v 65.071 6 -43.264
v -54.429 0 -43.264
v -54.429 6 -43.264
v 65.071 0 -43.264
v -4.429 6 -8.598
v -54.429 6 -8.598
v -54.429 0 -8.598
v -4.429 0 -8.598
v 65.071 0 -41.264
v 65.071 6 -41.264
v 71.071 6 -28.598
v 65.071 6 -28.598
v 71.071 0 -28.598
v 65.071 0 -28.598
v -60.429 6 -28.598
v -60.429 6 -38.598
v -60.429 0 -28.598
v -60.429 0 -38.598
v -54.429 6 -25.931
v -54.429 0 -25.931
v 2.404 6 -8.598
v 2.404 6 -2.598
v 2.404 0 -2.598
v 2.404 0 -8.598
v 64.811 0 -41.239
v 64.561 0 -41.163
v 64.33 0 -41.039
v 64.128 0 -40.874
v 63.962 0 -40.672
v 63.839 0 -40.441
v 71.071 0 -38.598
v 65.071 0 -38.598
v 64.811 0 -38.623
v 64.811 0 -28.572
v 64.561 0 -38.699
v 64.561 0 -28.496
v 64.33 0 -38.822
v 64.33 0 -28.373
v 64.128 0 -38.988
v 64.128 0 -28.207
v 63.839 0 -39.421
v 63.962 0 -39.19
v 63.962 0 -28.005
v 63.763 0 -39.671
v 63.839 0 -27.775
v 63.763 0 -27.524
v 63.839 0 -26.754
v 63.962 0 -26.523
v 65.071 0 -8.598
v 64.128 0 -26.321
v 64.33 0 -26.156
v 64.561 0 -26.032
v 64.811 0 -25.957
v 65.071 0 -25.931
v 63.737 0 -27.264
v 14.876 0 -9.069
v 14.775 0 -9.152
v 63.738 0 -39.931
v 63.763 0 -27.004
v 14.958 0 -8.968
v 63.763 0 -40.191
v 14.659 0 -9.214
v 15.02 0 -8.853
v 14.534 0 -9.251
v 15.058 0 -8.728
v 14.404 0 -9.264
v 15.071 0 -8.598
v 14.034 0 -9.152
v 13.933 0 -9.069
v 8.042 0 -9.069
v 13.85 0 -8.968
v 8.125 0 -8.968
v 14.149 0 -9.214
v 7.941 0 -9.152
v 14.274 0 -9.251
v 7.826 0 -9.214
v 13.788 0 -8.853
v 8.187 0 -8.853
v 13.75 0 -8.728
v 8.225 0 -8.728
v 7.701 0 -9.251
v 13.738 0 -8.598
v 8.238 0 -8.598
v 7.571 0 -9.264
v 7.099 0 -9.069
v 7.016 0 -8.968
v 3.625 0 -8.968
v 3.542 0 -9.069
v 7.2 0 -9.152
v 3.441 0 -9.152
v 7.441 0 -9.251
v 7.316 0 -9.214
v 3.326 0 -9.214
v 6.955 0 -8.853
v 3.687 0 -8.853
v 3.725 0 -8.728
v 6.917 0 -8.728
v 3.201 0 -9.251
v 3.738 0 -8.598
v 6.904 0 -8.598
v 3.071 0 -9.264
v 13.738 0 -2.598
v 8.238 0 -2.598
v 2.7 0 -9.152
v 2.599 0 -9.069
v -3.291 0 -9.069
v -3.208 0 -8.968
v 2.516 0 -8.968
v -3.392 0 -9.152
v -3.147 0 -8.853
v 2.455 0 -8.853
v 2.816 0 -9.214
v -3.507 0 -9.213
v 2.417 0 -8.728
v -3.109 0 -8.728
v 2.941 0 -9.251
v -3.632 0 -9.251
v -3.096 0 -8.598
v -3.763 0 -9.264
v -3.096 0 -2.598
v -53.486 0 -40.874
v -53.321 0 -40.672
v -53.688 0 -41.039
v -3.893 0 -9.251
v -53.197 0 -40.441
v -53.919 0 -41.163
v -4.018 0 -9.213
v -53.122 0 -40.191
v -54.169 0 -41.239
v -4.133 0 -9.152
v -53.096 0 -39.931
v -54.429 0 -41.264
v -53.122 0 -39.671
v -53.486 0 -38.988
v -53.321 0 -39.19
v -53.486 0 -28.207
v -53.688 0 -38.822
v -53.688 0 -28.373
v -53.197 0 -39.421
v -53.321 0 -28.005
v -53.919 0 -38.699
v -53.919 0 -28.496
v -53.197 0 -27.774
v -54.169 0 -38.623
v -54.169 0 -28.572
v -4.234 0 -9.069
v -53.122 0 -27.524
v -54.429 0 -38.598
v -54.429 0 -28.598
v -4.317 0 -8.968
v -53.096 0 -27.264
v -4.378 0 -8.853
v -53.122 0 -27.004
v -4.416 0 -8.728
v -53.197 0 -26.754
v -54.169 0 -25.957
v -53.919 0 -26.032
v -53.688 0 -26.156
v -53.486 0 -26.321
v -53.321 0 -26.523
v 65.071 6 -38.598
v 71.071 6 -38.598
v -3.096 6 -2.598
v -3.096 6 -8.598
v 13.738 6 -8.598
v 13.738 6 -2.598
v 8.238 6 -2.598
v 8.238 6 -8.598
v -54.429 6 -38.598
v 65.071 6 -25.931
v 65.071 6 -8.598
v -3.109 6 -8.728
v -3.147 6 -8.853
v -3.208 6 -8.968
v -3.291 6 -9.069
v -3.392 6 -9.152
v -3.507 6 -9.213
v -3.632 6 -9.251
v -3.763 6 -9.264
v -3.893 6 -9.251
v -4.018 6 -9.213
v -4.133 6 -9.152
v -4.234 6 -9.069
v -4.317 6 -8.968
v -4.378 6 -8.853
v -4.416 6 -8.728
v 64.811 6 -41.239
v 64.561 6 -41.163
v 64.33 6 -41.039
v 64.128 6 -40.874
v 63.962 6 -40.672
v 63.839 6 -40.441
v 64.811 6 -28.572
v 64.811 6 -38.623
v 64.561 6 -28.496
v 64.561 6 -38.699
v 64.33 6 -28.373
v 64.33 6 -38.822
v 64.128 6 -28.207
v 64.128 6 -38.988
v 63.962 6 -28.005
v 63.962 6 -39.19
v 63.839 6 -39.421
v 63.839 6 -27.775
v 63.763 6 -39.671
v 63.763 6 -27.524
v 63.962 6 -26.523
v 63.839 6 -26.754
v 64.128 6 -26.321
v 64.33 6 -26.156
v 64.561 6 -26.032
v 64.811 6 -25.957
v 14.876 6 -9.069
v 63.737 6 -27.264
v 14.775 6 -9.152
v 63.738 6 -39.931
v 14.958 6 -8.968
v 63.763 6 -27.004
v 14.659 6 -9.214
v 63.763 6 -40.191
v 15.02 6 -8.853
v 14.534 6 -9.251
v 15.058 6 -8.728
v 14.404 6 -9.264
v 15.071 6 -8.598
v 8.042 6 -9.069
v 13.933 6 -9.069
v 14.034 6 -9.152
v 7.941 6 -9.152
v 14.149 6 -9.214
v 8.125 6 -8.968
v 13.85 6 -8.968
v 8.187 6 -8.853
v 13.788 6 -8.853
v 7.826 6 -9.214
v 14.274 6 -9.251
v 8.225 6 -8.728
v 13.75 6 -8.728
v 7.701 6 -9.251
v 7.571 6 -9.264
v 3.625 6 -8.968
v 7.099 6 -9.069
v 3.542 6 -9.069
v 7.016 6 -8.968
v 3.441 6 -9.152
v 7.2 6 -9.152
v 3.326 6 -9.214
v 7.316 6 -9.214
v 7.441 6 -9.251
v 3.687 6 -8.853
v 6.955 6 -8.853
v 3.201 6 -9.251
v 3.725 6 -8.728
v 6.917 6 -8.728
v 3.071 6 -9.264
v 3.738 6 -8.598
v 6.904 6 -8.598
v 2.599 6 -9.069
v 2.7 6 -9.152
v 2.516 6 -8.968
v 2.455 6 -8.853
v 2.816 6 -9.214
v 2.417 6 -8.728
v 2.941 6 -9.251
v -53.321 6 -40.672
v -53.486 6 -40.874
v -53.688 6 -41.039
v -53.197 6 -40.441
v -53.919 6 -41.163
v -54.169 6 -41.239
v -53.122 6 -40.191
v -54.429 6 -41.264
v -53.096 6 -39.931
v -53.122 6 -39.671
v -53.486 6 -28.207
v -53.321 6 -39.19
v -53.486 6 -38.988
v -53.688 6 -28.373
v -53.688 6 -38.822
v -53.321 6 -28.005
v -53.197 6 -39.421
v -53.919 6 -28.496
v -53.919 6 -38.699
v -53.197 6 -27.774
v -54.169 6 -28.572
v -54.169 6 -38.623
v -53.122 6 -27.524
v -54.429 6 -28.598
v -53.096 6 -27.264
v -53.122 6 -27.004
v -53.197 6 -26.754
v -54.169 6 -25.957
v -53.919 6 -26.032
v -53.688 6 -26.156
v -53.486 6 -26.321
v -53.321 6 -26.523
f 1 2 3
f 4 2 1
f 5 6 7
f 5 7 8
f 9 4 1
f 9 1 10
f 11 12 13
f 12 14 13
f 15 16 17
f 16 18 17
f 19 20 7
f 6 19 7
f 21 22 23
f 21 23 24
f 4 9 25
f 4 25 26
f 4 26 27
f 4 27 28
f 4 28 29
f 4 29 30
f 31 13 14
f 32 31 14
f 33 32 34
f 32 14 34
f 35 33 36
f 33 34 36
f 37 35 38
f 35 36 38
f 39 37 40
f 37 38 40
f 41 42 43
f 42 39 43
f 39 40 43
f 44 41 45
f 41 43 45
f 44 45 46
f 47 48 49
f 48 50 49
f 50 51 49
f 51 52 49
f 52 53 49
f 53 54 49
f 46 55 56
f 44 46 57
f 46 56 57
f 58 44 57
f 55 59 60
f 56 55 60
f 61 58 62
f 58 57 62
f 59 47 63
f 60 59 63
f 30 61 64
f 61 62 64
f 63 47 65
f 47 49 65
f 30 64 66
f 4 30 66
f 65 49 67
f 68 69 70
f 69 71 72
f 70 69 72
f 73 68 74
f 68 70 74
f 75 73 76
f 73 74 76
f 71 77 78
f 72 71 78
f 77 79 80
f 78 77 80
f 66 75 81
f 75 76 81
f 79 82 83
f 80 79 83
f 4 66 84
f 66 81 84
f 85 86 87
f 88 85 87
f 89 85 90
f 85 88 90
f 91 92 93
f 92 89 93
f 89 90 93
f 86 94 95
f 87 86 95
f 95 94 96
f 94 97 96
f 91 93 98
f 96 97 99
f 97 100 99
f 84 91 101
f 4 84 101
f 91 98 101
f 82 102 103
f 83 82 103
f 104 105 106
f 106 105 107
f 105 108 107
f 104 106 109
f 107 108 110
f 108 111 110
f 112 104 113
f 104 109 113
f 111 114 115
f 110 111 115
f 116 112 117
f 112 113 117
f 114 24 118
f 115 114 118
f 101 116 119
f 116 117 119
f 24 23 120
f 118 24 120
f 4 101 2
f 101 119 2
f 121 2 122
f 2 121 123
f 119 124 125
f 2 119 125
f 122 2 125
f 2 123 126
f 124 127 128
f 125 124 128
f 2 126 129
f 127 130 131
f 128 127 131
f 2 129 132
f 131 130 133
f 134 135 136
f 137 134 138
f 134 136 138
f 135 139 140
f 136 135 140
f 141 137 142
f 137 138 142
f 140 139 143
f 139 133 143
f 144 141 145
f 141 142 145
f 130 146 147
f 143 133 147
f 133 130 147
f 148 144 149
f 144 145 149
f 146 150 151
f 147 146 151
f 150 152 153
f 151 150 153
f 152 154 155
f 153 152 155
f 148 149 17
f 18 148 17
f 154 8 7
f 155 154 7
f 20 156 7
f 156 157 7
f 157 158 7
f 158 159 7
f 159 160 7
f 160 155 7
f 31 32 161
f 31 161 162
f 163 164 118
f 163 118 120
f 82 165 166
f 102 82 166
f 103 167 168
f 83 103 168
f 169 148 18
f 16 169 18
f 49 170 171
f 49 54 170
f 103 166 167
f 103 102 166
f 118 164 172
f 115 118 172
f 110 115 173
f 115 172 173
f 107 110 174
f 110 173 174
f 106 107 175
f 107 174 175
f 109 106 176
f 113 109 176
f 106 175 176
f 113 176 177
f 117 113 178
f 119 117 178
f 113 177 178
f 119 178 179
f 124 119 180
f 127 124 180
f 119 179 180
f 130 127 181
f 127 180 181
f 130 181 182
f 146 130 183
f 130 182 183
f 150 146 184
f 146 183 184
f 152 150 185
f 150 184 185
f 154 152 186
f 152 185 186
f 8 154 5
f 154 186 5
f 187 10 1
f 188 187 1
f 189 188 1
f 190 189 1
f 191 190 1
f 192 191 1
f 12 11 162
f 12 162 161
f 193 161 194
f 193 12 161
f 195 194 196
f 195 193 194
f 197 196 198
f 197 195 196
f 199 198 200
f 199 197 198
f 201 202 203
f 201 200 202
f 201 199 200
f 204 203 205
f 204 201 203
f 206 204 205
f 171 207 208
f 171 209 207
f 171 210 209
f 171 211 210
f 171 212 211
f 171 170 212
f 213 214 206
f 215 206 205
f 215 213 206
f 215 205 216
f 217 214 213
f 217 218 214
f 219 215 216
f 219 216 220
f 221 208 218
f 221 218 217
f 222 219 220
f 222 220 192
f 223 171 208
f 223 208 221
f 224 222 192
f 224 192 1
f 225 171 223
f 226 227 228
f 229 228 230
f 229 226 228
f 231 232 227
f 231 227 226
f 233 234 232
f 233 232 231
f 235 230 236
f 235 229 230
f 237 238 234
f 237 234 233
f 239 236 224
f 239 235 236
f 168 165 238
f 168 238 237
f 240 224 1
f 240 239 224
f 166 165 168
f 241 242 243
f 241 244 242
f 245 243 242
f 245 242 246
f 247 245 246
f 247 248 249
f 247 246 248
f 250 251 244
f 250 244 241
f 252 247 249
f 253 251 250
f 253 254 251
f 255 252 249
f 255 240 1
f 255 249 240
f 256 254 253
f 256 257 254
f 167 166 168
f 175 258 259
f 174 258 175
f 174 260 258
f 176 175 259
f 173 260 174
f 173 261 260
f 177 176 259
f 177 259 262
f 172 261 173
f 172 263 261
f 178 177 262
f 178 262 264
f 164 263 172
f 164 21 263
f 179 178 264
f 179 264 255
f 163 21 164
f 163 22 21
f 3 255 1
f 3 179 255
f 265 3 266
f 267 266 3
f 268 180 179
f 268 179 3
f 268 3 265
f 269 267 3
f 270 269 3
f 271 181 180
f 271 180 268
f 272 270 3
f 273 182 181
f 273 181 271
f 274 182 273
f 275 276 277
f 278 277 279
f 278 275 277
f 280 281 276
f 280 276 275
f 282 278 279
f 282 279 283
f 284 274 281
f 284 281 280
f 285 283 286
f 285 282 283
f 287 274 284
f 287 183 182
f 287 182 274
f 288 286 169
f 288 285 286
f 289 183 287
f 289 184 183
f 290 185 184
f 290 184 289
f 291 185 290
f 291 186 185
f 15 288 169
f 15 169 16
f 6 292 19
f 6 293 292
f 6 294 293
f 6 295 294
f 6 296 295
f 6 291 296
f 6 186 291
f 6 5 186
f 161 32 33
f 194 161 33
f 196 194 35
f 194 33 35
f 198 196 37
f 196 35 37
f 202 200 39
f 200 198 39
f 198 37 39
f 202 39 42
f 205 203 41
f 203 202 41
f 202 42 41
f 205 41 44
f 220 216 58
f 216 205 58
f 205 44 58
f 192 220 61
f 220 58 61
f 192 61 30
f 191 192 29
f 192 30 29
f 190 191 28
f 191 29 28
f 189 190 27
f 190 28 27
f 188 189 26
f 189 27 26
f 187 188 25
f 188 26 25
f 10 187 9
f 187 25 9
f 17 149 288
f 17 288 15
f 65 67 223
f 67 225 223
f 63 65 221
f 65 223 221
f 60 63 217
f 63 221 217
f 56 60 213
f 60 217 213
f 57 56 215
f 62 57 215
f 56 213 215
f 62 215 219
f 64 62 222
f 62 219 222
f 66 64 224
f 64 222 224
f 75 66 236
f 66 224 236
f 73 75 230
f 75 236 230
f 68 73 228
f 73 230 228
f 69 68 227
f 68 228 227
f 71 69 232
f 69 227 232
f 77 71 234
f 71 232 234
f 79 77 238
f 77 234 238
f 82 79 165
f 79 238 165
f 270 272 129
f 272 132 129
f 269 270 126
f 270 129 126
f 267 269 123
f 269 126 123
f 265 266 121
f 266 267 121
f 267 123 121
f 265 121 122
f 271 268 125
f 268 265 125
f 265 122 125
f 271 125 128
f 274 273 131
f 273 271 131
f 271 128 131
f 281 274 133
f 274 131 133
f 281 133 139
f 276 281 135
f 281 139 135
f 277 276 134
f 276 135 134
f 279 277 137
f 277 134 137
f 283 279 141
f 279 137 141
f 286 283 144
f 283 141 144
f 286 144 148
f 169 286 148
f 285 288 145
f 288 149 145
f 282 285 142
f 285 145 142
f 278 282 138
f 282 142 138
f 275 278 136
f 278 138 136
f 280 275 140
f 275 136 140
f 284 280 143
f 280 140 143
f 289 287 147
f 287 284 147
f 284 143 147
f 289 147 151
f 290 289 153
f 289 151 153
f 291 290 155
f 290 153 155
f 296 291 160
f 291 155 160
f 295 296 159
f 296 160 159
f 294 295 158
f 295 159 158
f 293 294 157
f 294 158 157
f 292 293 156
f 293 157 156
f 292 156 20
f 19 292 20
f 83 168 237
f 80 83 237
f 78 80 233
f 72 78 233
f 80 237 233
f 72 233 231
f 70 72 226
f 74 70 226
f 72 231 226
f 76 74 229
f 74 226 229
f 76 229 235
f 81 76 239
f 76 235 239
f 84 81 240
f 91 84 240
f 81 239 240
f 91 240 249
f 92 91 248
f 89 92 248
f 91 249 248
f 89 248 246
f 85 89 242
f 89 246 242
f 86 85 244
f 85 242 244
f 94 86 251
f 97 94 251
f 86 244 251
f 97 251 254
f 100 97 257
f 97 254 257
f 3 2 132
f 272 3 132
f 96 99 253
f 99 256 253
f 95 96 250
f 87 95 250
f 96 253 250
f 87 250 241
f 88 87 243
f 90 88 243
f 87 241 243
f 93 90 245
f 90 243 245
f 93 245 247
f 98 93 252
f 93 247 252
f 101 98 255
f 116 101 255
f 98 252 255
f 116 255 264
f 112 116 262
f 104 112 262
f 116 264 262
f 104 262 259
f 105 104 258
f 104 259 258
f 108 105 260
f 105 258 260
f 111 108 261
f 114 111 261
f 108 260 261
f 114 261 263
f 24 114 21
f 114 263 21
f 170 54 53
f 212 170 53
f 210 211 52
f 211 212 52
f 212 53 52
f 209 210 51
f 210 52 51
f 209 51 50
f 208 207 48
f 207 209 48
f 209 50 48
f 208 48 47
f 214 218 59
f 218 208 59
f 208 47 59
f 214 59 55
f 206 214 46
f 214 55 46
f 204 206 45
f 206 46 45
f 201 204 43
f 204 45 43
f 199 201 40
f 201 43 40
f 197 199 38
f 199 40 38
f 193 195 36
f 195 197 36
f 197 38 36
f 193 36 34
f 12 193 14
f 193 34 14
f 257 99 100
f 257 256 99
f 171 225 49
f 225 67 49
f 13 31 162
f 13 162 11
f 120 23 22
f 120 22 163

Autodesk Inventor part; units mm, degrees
ref_plane "YZ Plane" through (0, 0, 0) normal (1, 0, 0) x (0, 1, 0)
ref_plane "XZ Plane" through (0, 0, 0) normal (0, 1, 0) x (-1, 0, 0)
ref_plane "XY Plane" through (0, 0, 0) normal (0, 0, 1) x (1, 0, 0)
sketch "Sketch1" plane through (0, 0, 0) normal (0, 1, 0) x (-1, 0, 0)
  line L0 (54.4292, -43.2642) -> (54.4292, -41.2642)
  arc A0 (54.4292, -38.5976) -> (54.4292, -41.2642) centre (54.4292, -39.9309) ccw
  arc A1 (54.4292, -25.9309) -> (54.4292, -28.5976) centre (54.4292, -27.2642) ccw
  line L1 (54.4292, -25.9309) -> (54.4292, -8.5976)
  line L2 (54.4292, -28.5976) -> (60.4292, -28.5976)
  line L3 (54.4292, -38.5976) -> (60.4292, -38.5976)
  line L4 (60.4292, -38.5976) -> (60.4292, -28.5976)
  line L5 (54.4292, -43.2642) -> (-65.0708, -43.2642)
  line L6 (-65.0708, -43.2642) -> (-65.0708, -41.2642)
  arc A2 (-65.0708, -41.2642) -> (-65.0708, -38.5976) centre (-65.0708, -39.9309) ccw
  arc A3 (-65.0708, -28.5976) -> (-65.0708, -25.9309) centre (-65.0708, -27.2642) ccw
  line L7 (-65.0708, -25.9309) -> (-65.0708, -8.5976)
  line L8 (-65.0708, -28.5976) -> (-71.0708, -28.5976)
  line L9 (-65.0708, -38.5976) -> (-71.0708, -38.5976)
  line L10 (-71.0708, -38.5976) -> (-71.0708, -28.5976)
  line L11 (-21.0708, -8.5976) -> (-65.0708, -8.5976)
  line L12 (54.4292, -8.5976) -> (10.4292, -8.5976)
  line L13 (-19.7375, -2.5976) -> (9.0959, -2.5976)
  line L14 (-19.7375, -8.5976) -> (-19.7375, -2.5976)
  line L15 (9.0959, -8.5976) -> (9.0959, -2.5976)
  line L16 (-21.0708, -8.5976) -> (-19.7375, -8.5976)
  line L17 (10.4292, -8.5976) -> (9.0959, -8.5976)
  point P0 (0, 0)
  dimension "d1" = 2
  dimension "d2" = 2.6667
  dimension "d5" = 2.6667
  dimension "d6" = 17.3333
  dimension "d9" = 6
  dimension "d10" = 119.5
  dimension "d11" = 10
  dimension "d18" = 44
  dimension "d19" = 44
  dimension "d21" = 20
  dimension "d23" = 6
extrude "Extrusion1" add sketch "Sketch1" along normal blind 6
sketch "Sketch2" plane through (0, 6, 0) normal (0, 1, 0) x (1, 0, 0)
  line L0 (2.4041, 2.5976) -> (2.4041, 8.5976)
  line L1 (-3.0959, 8.5976) -> (-3.0959, 2.5976)
  line L2 (-9.0959, 8.5976) -> (-9.0959, 2.5976) projected
  line L3 (13.7375, 8.5976) -> (13.7375, 2.5976)
  line L4 (8.2375, 2.5976) -> (8.2375, 8.5976)
  line L5 (19.7375, 2.5976) -> (19.7375, 8.5976) projected
  line L6 (-9.0959, 8.5976) -> (-4.4292, 8.5976)
  line L7 (-3.0959, 8.5976) -> (-3.0959, 2.5976)
  line L8 (-3.0959, 2.5976) -> (-9.0959, 2.5976)
  line L9 (-9.0959, 2.5976) -> (-9.0959, 8.5976)
  line L10 (3.7375, 8.5976) -> (6.9041, 8.5976)
  line L11 (8.2375, 8.5976) -> (8.2375, 2.5976)
  line L12 (8.2375, 2.5976) -> (2.4041, 2.5976)
  line L13 (2.4041, 2.5976) -> (2.4041, 8.5976)
  line L14 (15.0708, 8.5976) -> (19.7375, 8.5976)
  line L15 (19.7375, 8.5976) -> (19.7375, 2.5976)
  line L16 (19.7375, 2.5976) -> (13.7375, 2.5976)
  line L17 (13.7375, 2.5976) -> (13.7375, 8.5976)
  arc A0 (3.7375, 8.5976) -> (2.4041, 8.5976) centre (3.0708, 8.5976) ccw
  arc A1 (8.2375, 8.5976) -> (6.9041, 8.5976) centre (7.5708, 8.5976) ccw
  arc A2 (-3.0959, 8.5976) -> (-4.4292, 8.5976) centre (-3.7625, 8.5976) ccw
  arc A3 (15.0708, 8.5976) -> (13.7375, 8.5976) centre (14.4041, 8.5976) ccw
  point P0 (0, 0)
  dimension "d26" = 6
  dimension "d28" = 6
  dimension "d29" = 6
  dimension "d37" = 1.3333
  dimension "d38" = 1.3333
  dimension "d39" = 1.3333
  dimension "d40" = 1.3333
extrude "Extrusion2" cut sketch "Sketch2" against normal through all
properties part number "Support A Cross Dual2" material "Wood (Maple)"
